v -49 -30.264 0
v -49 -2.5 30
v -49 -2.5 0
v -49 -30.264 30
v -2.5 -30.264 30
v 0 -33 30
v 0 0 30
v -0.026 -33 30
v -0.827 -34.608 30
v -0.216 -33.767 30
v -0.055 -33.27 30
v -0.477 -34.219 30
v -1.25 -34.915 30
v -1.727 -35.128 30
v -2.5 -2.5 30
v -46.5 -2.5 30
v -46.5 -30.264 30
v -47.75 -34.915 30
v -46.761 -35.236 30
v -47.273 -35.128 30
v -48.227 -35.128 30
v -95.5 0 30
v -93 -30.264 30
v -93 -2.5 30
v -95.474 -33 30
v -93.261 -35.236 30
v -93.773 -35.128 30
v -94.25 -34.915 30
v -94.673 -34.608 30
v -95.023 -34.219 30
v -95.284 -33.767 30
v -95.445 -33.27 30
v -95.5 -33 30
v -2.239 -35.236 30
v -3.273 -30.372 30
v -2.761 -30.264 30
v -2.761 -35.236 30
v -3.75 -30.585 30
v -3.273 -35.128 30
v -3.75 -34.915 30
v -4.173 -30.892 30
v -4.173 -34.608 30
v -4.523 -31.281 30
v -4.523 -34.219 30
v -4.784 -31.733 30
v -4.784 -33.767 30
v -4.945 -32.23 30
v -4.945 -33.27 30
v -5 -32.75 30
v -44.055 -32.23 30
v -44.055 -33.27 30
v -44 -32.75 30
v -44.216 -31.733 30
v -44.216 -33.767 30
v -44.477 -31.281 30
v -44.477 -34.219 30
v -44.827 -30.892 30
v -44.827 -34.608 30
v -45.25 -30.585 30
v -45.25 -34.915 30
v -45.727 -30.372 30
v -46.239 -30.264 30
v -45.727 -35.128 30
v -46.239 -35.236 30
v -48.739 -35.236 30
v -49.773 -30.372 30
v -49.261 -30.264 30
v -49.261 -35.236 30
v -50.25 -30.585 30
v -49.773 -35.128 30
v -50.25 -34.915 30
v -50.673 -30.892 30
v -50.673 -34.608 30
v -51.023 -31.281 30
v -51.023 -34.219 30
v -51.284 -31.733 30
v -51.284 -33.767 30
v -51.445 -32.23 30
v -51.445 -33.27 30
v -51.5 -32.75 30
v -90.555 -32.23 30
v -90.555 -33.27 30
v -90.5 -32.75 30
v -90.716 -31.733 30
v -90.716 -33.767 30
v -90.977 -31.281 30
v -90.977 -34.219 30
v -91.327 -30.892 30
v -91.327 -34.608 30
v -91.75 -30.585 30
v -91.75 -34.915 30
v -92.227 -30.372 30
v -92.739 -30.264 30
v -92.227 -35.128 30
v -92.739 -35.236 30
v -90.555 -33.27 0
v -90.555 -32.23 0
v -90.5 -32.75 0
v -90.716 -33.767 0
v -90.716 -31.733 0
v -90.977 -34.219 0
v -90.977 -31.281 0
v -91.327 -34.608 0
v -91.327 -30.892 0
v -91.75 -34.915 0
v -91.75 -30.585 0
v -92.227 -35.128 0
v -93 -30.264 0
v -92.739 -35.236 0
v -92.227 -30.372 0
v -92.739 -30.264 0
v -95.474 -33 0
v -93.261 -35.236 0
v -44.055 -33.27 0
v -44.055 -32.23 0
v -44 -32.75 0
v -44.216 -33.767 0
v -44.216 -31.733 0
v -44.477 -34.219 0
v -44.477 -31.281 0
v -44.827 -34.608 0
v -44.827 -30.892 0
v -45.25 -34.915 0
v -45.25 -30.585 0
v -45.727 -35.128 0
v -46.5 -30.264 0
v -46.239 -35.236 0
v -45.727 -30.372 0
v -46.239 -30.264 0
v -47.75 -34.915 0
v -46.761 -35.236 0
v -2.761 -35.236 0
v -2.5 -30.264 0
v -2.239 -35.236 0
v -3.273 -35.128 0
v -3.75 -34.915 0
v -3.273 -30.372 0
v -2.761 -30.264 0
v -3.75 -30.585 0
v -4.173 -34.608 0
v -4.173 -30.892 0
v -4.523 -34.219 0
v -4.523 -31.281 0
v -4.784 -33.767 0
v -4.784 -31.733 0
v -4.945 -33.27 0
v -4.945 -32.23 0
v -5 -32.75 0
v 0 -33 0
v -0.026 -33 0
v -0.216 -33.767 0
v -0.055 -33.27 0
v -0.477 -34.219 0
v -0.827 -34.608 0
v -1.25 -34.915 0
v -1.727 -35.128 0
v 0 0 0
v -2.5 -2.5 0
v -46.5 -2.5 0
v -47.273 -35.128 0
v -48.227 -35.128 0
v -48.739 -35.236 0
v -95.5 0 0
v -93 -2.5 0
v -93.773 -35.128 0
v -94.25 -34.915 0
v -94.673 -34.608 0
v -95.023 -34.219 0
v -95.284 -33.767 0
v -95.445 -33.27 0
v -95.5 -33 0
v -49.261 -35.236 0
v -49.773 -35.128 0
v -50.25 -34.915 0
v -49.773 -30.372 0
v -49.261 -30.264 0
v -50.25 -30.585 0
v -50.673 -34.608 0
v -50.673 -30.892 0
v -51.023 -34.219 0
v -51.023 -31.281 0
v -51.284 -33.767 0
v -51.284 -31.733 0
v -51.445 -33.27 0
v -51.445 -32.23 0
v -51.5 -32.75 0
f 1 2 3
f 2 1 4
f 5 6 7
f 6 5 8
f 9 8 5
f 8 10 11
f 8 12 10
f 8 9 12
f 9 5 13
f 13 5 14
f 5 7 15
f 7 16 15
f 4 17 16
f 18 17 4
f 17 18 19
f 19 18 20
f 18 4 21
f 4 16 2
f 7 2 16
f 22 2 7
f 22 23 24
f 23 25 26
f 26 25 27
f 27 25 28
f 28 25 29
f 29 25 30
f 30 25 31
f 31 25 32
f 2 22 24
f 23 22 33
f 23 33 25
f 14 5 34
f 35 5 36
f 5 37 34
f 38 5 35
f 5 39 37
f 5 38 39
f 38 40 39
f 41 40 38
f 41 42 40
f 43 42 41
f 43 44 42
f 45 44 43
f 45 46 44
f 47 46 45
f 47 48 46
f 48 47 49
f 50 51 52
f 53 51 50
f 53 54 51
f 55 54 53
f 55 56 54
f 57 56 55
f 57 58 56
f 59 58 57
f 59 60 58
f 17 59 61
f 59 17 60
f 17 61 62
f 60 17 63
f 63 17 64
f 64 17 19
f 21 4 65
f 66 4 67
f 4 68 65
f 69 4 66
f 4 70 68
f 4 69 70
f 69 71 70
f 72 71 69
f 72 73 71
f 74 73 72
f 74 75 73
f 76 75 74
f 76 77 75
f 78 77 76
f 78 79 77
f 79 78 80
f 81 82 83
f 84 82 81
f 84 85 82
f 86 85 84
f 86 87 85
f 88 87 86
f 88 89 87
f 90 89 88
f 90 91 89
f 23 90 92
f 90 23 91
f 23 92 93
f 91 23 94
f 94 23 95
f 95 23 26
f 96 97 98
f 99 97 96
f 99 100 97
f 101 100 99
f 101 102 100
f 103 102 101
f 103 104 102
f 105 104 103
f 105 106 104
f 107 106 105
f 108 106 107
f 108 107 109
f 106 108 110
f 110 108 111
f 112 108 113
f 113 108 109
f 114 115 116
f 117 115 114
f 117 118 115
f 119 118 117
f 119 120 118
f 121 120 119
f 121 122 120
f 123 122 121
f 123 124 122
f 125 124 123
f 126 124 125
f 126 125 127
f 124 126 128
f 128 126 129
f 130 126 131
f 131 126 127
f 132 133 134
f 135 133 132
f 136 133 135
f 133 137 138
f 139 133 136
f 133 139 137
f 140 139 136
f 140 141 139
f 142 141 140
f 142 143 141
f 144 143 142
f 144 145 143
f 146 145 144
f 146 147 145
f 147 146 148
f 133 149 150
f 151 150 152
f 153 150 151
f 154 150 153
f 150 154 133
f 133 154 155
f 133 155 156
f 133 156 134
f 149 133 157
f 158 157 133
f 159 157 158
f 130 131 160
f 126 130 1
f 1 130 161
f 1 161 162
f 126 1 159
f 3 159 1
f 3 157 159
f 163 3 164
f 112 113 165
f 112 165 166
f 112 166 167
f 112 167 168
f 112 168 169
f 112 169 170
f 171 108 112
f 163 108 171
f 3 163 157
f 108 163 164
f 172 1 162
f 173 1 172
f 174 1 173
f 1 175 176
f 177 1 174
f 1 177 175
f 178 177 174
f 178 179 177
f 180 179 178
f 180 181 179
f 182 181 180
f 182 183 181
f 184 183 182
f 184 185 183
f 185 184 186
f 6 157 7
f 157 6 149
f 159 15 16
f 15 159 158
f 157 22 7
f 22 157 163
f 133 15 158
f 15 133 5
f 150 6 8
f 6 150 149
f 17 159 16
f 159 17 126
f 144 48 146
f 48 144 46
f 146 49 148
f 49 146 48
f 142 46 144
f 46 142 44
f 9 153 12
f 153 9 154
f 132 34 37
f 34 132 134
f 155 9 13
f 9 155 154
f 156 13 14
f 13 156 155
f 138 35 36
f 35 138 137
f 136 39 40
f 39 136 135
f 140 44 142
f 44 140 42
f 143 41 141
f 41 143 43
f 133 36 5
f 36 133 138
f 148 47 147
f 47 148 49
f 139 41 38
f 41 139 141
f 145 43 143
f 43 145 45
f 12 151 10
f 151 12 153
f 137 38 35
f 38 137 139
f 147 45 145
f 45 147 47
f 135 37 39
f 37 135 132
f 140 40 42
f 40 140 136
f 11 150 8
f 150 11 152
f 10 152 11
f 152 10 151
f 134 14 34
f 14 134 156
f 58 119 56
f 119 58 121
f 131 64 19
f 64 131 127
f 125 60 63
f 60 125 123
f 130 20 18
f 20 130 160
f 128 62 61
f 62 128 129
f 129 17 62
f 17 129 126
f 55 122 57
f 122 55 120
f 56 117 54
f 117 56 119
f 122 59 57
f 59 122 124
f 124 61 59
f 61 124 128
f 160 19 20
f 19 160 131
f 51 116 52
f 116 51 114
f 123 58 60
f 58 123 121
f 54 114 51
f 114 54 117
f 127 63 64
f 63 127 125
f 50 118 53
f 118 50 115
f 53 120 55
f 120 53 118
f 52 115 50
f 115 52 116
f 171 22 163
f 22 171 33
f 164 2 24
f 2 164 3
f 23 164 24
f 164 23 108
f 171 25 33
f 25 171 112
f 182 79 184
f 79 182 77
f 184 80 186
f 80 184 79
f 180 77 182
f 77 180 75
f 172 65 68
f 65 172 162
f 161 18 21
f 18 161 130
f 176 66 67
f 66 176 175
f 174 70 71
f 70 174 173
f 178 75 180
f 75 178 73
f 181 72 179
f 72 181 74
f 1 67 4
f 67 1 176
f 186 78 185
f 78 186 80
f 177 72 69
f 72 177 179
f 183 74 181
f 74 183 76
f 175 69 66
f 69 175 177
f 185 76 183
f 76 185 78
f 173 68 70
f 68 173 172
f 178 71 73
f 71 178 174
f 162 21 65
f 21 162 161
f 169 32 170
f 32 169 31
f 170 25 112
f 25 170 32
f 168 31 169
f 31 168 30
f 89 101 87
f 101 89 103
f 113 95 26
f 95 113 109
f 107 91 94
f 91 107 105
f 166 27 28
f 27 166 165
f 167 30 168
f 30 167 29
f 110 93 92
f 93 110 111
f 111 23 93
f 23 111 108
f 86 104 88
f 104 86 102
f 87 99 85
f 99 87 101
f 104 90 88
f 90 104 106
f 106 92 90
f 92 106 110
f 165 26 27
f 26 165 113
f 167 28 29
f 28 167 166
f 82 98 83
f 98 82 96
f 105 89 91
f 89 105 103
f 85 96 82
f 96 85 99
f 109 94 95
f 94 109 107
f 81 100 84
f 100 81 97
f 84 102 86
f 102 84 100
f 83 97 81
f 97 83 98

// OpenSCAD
// strap clip.scad

/* [Global] */
// How many in a row
clips=2; // [1,2,3,4,5,6,7,8]

// Mirror clips on the other side
mirror="no"; // [no,yes]

/* [Strap Size] */
// Width of the strap
strap_width=28; // 

// Width once it is rolled up
roll_width=44; // 

/* [Clip Parameters] */
// Size of knob holding the strap in
clip_overhang=2.5;

// Thickness of the holder
clip_thickness=2.5;

// Width of the holder
clip_width=30;



/* [Hidden] */

$fs=0.1;

clipHangRadius=clip_thickness/2+clip_overhang/2;

/*             X
 *      <---roll_width-->
 *     |=================|  <--clip_thickness
 *     |                 | 
 *   Y |                 |   ^
 *     |__             __|   v strap_width
 * 
 *     ^               <> ---clip_overhang
 *      \-clip_thickness
 * 
 */

module clip() {
	*translate([roll_width,clip_thickness,0])
	cube([clip_thickness,strap_width,clip_width]);
	cube([roll_width+2*clip_thickness,clip_thickness,clip_width]);
	cube([clip_thickness,strap_width+clip_thickness*2,clip_width]);
	translate([roll_width+clip_thickness,0,0])
		cube([clip_thickness,strap_width+clip_thickness*2,clip_width]);
	translate([clipHangRadius,strap_width+clip_thickness*1.9,0])
		cylinder(r=clipHangRadius,h=clip_width);
	translate([roll_width+2*clip_thickness-clipHangRadius,strap_width+clip_thickness*1.9,0])
		cylinder(r=clipHangRadius,h=clip_width);
}

rotate([0,0,180]) {
	for (i = [0 : clips-1])
	{
	translate([i*(clip_thickness+roll_width),0,0])
	clip();
	if (mirror=="yes")
		translate([i*(clip_thickness+roll_width),clip_thickness/2,0])
			mirror([0,1,0])
				clip();
	}
}
